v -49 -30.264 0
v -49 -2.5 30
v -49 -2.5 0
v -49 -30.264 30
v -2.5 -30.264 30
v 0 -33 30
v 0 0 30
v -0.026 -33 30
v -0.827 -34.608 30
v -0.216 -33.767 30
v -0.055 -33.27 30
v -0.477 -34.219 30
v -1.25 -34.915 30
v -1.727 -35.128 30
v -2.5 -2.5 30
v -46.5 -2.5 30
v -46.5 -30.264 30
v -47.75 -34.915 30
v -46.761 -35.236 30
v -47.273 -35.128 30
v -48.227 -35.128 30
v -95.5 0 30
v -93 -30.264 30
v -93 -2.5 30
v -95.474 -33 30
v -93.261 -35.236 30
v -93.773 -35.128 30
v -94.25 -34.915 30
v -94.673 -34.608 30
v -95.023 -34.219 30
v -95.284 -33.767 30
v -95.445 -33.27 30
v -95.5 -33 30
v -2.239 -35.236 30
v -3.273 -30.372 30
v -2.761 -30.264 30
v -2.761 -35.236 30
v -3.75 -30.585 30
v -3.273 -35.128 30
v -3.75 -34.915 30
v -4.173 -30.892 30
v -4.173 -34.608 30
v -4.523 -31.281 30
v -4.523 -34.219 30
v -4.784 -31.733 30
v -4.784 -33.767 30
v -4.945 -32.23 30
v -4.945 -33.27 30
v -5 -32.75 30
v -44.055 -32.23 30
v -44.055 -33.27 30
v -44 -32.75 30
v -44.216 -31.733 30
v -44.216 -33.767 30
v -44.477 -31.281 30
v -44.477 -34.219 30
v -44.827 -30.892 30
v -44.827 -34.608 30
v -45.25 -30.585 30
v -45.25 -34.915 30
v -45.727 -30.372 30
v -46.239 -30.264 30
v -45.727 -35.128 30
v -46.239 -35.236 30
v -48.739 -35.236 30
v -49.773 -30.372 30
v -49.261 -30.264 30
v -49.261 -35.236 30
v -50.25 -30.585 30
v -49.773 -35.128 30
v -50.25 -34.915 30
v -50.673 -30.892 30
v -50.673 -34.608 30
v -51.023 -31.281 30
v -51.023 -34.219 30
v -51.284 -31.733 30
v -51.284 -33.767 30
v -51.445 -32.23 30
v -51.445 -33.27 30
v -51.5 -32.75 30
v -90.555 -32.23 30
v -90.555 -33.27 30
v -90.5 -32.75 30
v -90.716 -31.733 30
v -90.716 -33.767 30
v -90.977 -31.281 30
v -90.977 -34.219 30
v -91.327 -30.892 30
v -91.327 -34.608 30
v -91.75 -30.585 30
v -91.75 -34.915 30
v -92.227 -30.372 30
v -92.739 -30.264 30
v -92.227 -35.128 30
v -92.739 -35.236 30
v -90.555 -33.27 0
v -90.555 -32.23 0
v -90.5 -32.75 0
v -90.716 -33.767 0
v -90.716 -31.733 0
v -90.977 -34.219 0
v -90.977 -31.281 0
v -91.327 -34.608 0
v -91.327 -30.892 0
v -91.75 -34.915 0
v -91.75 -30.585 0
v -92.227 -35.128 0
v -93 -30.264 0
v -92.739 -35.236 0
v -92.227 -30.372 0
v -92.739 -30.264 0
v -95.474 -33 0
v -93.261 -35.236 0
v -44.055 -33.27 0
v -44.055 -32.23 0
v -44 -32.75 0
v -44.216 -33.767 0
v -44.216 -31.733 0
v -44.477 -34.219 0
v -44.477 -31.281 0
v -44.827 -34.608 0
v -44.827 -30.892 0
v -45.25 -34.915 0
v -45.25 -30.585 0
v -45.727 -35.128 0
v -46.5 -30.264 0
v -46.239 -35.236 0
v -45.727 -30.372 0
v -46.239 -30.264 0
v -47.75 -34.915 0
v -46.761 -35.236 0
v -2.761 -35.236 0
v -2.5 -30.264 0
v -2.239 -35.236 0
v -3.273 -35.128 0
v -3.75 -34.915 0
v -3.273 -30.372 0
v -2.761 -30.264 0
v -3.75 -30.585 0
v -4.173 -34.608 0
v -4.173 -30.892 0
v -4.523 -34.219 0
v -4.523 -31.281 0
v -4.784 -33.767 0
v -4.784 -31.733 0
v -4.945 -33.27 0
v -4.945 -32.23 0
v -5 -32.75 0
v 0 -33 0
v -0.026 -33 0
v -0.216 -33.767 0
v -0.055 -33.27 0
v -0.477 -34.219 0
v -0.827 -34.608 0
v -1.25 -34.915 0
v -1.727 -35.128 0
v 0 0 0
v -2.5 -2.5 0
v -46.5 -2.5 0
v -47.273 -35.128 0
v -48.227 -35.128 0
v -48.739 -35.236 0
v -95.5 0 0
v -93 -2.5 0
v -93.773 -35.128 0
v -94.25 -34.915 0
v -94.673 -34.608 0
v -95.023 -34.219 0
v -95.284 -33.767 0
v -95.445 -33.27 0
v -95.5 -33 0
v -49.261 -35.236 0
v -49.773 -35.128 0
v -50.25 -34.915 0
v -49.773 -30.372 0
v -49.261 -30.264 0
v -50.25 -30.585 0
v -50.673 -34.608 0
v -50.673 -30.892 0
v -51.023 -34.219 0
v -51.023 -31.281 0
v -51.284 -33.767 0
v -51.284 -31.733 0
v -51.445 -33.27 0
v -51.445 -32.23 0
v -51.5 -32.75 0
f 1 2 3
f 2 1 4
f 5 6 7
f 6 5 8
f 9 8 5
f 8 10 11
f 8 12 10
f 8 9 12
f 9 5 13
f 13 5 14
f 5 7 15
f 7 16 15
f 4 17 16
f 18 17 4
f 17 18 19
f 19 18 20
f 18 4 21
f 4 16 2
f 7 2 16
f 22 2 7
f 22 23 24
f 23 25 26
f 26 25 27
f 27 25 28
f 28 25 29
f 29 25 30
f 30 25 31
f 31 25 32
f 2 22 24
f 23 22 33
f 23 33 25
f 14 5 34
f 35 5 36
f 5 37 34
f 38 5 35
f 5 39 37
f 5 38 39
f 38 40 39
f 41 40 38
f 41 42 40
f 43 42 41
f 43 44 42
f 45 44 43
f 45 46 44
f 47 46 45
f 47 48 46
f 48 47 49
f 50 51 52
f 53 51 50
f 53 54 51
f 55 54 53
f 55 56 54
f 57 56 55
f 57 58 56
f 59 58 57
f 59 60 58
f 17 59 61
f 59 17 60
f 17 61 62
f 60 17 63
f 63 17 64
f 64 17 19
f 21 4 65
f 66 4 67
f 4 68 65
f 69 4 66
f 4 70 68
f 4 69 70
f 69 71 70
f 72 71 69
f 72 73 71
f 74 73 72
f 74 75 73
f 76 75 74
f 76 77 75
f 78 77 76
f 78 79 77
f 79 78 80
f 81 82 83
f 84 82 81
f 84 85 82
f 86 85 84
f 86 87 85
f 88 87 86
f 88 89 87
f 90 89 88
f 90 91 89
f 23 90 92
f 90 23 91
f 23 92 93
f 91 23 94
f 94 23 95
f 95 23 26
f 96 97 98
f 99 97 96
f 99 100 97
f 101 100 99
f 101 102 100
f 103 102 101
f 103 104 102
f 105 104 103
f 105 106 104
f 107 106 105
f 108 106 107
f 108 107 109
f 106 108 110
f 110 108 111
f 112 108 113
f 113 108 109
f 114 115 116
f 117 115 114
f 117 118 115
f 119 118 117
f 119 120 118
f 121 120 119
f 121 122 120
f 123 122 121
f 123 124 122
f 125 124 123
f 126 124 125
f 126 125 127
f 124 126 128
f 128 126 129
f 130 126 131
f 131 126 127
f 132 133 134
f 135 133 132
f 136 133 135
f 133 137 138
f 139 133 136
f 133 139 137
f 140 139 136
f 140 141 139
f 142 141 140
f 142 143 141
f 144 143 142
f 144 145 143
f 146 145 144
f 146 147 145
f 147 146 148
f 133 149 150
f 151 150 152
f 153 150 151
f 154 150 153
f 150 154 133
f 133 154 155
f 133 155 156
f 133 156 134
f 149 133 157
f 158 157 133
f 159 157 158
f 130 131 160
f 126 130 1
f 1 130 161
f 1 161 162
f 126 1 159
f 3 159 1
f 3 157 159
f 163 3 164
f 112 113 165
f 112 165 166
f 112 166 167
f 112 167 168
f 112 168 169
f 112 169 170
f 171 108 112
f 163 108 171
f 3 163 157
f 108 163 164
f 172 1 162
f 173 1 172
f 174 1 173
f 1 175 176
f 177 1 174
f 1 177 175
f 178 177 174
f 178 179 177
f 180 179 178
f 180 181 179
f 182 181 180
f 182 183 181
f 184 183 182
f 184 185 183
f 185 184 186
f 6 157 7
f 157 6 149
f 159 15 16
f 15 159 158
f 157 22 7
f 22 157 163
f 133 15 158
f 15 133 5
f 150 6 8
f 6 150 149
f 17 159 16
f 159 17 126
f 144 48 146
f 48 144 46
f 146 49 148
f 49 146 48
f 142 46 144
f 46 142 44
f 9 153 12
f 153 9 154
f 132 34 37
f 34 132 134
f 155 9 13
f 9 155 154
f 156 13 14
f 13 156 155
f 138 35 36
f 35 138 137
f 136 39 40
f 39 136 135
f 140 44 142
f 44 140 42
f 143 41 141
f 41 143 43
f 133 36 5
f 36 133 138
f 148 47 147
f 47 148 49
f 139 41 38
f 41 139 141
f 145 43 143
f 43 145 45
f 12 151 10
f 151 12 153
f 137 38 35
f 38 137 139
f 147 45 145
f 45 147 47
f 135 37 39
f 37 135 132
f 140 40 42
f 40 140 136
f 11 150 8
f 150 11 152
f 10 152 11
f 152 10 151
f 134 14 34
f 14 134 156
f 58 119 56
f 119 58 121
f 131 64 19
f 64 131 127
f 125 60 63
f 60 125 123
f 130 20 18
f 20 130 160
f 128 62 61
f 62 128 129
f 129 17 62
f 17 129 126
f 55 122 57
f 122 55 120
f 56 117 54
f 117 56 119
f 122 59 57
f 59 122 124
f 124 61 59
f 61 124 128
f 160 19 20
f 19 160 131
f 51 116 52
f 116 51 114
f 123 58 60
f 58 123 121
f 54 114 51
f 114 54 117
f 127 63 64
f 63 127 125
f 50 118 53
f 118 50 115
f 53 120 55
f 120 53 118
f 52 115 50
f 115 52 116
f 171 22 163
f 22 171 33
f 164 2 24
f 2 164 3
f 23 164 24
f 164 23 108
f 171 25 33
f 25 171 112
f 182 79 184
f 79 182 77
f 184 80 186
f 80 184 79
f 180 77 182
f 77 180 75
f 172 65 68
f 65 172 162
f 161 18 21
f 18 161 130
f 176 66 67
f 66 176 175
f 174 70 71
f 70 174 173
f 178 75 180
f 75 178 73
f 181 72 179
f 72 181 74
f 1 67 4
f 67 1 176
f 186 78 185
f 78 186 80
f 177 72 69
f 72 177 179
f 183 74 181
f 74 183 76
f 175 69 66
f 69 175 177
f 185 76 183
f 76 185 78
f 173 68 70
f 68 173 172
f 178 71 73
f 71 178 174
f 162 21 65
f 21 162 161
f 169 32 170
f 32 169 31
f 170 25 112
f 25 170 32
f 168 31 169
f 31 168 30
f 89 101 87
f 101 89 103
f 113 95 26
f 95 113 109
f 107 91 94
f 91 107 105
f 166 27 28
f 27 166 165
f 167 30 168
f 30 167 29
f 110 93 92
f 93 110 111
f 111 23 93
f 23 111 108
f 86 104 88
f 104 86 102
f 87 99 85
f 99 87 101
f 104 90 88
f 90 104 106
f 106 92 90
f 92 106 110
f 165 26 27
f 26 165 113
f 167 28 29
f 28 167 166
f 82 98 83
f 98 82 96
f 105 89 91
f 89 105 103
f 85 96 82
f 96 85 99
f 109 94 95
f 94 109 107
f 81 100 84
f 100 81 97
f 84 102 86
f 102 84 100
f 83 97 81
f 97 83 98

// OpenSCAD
// strap clip.scad

/* [Global] */
// How many in a row
clips=2; // [1,2,3,4,5,6,7,8]

// Mirror clips on the other side
mirror="no"; // [no,yes]

/* [Strap Size] */
// Width of the strap
strap_width=28; // 

// Width once it is rolled up
roll_width=44; // 

/* [Clip Parameters] */
// Size of knob holding the strap in
clip_overhang=2.5;

// Thickness of the holder
clip_thickness=2.5;

// Width of the holder
clip_width=30;



/* [Hidden] */

$fs=0.1;

clipHangRadius=clip_thickness/2+clip_overhang/2;

/*             X
 *      <---roll_width-->
 *     |=================|  <--clip_thickness
 *     |                 | 
 *   Y |                 |   ^
 *     |__             __|   v strap_width
 * 
 *     ^               <> ---clip_overhang
 *      \-clip_thickness
 * 
 */

module clip() {
	*translate([roll_width,clip_thickness,0])
	cube([clip_thickness,strap_width,clip_width]);
	cube([roll_width+2*clip_thickness,clip_thickness,clip_width]);
	cube([clip_thickness,strap_width+clip_thickness*2,clip_width]);
	translate([roll_width+clip_thickness,0,0])
		cube([clip_thickness,strap_width+clip_thickness*2,clip_width]);
	translate([clipHangRadius,strap_width+clip_thickness*1.9,0])
		cylinder(r=clipHangRadius,h=clip_width);
	translate([roll_width+2*clip_thickness-clipHangRadius,strap_width+clip_thickness*1.9,0])
		cylinder(r=clipHangRadius,h=clip_width);
}

rotate([0,0,180]) {
	for (i = [0 : clips-1])
	{
	translate([i*(clip_thickness+roll_width),0,0])
	clip();
	if (mirror=="yes")
		translate([i*(clip_thickness+roll_width),clip_thickness/2,0])
			mirror([0,1,0])
				clip();
	}
}
